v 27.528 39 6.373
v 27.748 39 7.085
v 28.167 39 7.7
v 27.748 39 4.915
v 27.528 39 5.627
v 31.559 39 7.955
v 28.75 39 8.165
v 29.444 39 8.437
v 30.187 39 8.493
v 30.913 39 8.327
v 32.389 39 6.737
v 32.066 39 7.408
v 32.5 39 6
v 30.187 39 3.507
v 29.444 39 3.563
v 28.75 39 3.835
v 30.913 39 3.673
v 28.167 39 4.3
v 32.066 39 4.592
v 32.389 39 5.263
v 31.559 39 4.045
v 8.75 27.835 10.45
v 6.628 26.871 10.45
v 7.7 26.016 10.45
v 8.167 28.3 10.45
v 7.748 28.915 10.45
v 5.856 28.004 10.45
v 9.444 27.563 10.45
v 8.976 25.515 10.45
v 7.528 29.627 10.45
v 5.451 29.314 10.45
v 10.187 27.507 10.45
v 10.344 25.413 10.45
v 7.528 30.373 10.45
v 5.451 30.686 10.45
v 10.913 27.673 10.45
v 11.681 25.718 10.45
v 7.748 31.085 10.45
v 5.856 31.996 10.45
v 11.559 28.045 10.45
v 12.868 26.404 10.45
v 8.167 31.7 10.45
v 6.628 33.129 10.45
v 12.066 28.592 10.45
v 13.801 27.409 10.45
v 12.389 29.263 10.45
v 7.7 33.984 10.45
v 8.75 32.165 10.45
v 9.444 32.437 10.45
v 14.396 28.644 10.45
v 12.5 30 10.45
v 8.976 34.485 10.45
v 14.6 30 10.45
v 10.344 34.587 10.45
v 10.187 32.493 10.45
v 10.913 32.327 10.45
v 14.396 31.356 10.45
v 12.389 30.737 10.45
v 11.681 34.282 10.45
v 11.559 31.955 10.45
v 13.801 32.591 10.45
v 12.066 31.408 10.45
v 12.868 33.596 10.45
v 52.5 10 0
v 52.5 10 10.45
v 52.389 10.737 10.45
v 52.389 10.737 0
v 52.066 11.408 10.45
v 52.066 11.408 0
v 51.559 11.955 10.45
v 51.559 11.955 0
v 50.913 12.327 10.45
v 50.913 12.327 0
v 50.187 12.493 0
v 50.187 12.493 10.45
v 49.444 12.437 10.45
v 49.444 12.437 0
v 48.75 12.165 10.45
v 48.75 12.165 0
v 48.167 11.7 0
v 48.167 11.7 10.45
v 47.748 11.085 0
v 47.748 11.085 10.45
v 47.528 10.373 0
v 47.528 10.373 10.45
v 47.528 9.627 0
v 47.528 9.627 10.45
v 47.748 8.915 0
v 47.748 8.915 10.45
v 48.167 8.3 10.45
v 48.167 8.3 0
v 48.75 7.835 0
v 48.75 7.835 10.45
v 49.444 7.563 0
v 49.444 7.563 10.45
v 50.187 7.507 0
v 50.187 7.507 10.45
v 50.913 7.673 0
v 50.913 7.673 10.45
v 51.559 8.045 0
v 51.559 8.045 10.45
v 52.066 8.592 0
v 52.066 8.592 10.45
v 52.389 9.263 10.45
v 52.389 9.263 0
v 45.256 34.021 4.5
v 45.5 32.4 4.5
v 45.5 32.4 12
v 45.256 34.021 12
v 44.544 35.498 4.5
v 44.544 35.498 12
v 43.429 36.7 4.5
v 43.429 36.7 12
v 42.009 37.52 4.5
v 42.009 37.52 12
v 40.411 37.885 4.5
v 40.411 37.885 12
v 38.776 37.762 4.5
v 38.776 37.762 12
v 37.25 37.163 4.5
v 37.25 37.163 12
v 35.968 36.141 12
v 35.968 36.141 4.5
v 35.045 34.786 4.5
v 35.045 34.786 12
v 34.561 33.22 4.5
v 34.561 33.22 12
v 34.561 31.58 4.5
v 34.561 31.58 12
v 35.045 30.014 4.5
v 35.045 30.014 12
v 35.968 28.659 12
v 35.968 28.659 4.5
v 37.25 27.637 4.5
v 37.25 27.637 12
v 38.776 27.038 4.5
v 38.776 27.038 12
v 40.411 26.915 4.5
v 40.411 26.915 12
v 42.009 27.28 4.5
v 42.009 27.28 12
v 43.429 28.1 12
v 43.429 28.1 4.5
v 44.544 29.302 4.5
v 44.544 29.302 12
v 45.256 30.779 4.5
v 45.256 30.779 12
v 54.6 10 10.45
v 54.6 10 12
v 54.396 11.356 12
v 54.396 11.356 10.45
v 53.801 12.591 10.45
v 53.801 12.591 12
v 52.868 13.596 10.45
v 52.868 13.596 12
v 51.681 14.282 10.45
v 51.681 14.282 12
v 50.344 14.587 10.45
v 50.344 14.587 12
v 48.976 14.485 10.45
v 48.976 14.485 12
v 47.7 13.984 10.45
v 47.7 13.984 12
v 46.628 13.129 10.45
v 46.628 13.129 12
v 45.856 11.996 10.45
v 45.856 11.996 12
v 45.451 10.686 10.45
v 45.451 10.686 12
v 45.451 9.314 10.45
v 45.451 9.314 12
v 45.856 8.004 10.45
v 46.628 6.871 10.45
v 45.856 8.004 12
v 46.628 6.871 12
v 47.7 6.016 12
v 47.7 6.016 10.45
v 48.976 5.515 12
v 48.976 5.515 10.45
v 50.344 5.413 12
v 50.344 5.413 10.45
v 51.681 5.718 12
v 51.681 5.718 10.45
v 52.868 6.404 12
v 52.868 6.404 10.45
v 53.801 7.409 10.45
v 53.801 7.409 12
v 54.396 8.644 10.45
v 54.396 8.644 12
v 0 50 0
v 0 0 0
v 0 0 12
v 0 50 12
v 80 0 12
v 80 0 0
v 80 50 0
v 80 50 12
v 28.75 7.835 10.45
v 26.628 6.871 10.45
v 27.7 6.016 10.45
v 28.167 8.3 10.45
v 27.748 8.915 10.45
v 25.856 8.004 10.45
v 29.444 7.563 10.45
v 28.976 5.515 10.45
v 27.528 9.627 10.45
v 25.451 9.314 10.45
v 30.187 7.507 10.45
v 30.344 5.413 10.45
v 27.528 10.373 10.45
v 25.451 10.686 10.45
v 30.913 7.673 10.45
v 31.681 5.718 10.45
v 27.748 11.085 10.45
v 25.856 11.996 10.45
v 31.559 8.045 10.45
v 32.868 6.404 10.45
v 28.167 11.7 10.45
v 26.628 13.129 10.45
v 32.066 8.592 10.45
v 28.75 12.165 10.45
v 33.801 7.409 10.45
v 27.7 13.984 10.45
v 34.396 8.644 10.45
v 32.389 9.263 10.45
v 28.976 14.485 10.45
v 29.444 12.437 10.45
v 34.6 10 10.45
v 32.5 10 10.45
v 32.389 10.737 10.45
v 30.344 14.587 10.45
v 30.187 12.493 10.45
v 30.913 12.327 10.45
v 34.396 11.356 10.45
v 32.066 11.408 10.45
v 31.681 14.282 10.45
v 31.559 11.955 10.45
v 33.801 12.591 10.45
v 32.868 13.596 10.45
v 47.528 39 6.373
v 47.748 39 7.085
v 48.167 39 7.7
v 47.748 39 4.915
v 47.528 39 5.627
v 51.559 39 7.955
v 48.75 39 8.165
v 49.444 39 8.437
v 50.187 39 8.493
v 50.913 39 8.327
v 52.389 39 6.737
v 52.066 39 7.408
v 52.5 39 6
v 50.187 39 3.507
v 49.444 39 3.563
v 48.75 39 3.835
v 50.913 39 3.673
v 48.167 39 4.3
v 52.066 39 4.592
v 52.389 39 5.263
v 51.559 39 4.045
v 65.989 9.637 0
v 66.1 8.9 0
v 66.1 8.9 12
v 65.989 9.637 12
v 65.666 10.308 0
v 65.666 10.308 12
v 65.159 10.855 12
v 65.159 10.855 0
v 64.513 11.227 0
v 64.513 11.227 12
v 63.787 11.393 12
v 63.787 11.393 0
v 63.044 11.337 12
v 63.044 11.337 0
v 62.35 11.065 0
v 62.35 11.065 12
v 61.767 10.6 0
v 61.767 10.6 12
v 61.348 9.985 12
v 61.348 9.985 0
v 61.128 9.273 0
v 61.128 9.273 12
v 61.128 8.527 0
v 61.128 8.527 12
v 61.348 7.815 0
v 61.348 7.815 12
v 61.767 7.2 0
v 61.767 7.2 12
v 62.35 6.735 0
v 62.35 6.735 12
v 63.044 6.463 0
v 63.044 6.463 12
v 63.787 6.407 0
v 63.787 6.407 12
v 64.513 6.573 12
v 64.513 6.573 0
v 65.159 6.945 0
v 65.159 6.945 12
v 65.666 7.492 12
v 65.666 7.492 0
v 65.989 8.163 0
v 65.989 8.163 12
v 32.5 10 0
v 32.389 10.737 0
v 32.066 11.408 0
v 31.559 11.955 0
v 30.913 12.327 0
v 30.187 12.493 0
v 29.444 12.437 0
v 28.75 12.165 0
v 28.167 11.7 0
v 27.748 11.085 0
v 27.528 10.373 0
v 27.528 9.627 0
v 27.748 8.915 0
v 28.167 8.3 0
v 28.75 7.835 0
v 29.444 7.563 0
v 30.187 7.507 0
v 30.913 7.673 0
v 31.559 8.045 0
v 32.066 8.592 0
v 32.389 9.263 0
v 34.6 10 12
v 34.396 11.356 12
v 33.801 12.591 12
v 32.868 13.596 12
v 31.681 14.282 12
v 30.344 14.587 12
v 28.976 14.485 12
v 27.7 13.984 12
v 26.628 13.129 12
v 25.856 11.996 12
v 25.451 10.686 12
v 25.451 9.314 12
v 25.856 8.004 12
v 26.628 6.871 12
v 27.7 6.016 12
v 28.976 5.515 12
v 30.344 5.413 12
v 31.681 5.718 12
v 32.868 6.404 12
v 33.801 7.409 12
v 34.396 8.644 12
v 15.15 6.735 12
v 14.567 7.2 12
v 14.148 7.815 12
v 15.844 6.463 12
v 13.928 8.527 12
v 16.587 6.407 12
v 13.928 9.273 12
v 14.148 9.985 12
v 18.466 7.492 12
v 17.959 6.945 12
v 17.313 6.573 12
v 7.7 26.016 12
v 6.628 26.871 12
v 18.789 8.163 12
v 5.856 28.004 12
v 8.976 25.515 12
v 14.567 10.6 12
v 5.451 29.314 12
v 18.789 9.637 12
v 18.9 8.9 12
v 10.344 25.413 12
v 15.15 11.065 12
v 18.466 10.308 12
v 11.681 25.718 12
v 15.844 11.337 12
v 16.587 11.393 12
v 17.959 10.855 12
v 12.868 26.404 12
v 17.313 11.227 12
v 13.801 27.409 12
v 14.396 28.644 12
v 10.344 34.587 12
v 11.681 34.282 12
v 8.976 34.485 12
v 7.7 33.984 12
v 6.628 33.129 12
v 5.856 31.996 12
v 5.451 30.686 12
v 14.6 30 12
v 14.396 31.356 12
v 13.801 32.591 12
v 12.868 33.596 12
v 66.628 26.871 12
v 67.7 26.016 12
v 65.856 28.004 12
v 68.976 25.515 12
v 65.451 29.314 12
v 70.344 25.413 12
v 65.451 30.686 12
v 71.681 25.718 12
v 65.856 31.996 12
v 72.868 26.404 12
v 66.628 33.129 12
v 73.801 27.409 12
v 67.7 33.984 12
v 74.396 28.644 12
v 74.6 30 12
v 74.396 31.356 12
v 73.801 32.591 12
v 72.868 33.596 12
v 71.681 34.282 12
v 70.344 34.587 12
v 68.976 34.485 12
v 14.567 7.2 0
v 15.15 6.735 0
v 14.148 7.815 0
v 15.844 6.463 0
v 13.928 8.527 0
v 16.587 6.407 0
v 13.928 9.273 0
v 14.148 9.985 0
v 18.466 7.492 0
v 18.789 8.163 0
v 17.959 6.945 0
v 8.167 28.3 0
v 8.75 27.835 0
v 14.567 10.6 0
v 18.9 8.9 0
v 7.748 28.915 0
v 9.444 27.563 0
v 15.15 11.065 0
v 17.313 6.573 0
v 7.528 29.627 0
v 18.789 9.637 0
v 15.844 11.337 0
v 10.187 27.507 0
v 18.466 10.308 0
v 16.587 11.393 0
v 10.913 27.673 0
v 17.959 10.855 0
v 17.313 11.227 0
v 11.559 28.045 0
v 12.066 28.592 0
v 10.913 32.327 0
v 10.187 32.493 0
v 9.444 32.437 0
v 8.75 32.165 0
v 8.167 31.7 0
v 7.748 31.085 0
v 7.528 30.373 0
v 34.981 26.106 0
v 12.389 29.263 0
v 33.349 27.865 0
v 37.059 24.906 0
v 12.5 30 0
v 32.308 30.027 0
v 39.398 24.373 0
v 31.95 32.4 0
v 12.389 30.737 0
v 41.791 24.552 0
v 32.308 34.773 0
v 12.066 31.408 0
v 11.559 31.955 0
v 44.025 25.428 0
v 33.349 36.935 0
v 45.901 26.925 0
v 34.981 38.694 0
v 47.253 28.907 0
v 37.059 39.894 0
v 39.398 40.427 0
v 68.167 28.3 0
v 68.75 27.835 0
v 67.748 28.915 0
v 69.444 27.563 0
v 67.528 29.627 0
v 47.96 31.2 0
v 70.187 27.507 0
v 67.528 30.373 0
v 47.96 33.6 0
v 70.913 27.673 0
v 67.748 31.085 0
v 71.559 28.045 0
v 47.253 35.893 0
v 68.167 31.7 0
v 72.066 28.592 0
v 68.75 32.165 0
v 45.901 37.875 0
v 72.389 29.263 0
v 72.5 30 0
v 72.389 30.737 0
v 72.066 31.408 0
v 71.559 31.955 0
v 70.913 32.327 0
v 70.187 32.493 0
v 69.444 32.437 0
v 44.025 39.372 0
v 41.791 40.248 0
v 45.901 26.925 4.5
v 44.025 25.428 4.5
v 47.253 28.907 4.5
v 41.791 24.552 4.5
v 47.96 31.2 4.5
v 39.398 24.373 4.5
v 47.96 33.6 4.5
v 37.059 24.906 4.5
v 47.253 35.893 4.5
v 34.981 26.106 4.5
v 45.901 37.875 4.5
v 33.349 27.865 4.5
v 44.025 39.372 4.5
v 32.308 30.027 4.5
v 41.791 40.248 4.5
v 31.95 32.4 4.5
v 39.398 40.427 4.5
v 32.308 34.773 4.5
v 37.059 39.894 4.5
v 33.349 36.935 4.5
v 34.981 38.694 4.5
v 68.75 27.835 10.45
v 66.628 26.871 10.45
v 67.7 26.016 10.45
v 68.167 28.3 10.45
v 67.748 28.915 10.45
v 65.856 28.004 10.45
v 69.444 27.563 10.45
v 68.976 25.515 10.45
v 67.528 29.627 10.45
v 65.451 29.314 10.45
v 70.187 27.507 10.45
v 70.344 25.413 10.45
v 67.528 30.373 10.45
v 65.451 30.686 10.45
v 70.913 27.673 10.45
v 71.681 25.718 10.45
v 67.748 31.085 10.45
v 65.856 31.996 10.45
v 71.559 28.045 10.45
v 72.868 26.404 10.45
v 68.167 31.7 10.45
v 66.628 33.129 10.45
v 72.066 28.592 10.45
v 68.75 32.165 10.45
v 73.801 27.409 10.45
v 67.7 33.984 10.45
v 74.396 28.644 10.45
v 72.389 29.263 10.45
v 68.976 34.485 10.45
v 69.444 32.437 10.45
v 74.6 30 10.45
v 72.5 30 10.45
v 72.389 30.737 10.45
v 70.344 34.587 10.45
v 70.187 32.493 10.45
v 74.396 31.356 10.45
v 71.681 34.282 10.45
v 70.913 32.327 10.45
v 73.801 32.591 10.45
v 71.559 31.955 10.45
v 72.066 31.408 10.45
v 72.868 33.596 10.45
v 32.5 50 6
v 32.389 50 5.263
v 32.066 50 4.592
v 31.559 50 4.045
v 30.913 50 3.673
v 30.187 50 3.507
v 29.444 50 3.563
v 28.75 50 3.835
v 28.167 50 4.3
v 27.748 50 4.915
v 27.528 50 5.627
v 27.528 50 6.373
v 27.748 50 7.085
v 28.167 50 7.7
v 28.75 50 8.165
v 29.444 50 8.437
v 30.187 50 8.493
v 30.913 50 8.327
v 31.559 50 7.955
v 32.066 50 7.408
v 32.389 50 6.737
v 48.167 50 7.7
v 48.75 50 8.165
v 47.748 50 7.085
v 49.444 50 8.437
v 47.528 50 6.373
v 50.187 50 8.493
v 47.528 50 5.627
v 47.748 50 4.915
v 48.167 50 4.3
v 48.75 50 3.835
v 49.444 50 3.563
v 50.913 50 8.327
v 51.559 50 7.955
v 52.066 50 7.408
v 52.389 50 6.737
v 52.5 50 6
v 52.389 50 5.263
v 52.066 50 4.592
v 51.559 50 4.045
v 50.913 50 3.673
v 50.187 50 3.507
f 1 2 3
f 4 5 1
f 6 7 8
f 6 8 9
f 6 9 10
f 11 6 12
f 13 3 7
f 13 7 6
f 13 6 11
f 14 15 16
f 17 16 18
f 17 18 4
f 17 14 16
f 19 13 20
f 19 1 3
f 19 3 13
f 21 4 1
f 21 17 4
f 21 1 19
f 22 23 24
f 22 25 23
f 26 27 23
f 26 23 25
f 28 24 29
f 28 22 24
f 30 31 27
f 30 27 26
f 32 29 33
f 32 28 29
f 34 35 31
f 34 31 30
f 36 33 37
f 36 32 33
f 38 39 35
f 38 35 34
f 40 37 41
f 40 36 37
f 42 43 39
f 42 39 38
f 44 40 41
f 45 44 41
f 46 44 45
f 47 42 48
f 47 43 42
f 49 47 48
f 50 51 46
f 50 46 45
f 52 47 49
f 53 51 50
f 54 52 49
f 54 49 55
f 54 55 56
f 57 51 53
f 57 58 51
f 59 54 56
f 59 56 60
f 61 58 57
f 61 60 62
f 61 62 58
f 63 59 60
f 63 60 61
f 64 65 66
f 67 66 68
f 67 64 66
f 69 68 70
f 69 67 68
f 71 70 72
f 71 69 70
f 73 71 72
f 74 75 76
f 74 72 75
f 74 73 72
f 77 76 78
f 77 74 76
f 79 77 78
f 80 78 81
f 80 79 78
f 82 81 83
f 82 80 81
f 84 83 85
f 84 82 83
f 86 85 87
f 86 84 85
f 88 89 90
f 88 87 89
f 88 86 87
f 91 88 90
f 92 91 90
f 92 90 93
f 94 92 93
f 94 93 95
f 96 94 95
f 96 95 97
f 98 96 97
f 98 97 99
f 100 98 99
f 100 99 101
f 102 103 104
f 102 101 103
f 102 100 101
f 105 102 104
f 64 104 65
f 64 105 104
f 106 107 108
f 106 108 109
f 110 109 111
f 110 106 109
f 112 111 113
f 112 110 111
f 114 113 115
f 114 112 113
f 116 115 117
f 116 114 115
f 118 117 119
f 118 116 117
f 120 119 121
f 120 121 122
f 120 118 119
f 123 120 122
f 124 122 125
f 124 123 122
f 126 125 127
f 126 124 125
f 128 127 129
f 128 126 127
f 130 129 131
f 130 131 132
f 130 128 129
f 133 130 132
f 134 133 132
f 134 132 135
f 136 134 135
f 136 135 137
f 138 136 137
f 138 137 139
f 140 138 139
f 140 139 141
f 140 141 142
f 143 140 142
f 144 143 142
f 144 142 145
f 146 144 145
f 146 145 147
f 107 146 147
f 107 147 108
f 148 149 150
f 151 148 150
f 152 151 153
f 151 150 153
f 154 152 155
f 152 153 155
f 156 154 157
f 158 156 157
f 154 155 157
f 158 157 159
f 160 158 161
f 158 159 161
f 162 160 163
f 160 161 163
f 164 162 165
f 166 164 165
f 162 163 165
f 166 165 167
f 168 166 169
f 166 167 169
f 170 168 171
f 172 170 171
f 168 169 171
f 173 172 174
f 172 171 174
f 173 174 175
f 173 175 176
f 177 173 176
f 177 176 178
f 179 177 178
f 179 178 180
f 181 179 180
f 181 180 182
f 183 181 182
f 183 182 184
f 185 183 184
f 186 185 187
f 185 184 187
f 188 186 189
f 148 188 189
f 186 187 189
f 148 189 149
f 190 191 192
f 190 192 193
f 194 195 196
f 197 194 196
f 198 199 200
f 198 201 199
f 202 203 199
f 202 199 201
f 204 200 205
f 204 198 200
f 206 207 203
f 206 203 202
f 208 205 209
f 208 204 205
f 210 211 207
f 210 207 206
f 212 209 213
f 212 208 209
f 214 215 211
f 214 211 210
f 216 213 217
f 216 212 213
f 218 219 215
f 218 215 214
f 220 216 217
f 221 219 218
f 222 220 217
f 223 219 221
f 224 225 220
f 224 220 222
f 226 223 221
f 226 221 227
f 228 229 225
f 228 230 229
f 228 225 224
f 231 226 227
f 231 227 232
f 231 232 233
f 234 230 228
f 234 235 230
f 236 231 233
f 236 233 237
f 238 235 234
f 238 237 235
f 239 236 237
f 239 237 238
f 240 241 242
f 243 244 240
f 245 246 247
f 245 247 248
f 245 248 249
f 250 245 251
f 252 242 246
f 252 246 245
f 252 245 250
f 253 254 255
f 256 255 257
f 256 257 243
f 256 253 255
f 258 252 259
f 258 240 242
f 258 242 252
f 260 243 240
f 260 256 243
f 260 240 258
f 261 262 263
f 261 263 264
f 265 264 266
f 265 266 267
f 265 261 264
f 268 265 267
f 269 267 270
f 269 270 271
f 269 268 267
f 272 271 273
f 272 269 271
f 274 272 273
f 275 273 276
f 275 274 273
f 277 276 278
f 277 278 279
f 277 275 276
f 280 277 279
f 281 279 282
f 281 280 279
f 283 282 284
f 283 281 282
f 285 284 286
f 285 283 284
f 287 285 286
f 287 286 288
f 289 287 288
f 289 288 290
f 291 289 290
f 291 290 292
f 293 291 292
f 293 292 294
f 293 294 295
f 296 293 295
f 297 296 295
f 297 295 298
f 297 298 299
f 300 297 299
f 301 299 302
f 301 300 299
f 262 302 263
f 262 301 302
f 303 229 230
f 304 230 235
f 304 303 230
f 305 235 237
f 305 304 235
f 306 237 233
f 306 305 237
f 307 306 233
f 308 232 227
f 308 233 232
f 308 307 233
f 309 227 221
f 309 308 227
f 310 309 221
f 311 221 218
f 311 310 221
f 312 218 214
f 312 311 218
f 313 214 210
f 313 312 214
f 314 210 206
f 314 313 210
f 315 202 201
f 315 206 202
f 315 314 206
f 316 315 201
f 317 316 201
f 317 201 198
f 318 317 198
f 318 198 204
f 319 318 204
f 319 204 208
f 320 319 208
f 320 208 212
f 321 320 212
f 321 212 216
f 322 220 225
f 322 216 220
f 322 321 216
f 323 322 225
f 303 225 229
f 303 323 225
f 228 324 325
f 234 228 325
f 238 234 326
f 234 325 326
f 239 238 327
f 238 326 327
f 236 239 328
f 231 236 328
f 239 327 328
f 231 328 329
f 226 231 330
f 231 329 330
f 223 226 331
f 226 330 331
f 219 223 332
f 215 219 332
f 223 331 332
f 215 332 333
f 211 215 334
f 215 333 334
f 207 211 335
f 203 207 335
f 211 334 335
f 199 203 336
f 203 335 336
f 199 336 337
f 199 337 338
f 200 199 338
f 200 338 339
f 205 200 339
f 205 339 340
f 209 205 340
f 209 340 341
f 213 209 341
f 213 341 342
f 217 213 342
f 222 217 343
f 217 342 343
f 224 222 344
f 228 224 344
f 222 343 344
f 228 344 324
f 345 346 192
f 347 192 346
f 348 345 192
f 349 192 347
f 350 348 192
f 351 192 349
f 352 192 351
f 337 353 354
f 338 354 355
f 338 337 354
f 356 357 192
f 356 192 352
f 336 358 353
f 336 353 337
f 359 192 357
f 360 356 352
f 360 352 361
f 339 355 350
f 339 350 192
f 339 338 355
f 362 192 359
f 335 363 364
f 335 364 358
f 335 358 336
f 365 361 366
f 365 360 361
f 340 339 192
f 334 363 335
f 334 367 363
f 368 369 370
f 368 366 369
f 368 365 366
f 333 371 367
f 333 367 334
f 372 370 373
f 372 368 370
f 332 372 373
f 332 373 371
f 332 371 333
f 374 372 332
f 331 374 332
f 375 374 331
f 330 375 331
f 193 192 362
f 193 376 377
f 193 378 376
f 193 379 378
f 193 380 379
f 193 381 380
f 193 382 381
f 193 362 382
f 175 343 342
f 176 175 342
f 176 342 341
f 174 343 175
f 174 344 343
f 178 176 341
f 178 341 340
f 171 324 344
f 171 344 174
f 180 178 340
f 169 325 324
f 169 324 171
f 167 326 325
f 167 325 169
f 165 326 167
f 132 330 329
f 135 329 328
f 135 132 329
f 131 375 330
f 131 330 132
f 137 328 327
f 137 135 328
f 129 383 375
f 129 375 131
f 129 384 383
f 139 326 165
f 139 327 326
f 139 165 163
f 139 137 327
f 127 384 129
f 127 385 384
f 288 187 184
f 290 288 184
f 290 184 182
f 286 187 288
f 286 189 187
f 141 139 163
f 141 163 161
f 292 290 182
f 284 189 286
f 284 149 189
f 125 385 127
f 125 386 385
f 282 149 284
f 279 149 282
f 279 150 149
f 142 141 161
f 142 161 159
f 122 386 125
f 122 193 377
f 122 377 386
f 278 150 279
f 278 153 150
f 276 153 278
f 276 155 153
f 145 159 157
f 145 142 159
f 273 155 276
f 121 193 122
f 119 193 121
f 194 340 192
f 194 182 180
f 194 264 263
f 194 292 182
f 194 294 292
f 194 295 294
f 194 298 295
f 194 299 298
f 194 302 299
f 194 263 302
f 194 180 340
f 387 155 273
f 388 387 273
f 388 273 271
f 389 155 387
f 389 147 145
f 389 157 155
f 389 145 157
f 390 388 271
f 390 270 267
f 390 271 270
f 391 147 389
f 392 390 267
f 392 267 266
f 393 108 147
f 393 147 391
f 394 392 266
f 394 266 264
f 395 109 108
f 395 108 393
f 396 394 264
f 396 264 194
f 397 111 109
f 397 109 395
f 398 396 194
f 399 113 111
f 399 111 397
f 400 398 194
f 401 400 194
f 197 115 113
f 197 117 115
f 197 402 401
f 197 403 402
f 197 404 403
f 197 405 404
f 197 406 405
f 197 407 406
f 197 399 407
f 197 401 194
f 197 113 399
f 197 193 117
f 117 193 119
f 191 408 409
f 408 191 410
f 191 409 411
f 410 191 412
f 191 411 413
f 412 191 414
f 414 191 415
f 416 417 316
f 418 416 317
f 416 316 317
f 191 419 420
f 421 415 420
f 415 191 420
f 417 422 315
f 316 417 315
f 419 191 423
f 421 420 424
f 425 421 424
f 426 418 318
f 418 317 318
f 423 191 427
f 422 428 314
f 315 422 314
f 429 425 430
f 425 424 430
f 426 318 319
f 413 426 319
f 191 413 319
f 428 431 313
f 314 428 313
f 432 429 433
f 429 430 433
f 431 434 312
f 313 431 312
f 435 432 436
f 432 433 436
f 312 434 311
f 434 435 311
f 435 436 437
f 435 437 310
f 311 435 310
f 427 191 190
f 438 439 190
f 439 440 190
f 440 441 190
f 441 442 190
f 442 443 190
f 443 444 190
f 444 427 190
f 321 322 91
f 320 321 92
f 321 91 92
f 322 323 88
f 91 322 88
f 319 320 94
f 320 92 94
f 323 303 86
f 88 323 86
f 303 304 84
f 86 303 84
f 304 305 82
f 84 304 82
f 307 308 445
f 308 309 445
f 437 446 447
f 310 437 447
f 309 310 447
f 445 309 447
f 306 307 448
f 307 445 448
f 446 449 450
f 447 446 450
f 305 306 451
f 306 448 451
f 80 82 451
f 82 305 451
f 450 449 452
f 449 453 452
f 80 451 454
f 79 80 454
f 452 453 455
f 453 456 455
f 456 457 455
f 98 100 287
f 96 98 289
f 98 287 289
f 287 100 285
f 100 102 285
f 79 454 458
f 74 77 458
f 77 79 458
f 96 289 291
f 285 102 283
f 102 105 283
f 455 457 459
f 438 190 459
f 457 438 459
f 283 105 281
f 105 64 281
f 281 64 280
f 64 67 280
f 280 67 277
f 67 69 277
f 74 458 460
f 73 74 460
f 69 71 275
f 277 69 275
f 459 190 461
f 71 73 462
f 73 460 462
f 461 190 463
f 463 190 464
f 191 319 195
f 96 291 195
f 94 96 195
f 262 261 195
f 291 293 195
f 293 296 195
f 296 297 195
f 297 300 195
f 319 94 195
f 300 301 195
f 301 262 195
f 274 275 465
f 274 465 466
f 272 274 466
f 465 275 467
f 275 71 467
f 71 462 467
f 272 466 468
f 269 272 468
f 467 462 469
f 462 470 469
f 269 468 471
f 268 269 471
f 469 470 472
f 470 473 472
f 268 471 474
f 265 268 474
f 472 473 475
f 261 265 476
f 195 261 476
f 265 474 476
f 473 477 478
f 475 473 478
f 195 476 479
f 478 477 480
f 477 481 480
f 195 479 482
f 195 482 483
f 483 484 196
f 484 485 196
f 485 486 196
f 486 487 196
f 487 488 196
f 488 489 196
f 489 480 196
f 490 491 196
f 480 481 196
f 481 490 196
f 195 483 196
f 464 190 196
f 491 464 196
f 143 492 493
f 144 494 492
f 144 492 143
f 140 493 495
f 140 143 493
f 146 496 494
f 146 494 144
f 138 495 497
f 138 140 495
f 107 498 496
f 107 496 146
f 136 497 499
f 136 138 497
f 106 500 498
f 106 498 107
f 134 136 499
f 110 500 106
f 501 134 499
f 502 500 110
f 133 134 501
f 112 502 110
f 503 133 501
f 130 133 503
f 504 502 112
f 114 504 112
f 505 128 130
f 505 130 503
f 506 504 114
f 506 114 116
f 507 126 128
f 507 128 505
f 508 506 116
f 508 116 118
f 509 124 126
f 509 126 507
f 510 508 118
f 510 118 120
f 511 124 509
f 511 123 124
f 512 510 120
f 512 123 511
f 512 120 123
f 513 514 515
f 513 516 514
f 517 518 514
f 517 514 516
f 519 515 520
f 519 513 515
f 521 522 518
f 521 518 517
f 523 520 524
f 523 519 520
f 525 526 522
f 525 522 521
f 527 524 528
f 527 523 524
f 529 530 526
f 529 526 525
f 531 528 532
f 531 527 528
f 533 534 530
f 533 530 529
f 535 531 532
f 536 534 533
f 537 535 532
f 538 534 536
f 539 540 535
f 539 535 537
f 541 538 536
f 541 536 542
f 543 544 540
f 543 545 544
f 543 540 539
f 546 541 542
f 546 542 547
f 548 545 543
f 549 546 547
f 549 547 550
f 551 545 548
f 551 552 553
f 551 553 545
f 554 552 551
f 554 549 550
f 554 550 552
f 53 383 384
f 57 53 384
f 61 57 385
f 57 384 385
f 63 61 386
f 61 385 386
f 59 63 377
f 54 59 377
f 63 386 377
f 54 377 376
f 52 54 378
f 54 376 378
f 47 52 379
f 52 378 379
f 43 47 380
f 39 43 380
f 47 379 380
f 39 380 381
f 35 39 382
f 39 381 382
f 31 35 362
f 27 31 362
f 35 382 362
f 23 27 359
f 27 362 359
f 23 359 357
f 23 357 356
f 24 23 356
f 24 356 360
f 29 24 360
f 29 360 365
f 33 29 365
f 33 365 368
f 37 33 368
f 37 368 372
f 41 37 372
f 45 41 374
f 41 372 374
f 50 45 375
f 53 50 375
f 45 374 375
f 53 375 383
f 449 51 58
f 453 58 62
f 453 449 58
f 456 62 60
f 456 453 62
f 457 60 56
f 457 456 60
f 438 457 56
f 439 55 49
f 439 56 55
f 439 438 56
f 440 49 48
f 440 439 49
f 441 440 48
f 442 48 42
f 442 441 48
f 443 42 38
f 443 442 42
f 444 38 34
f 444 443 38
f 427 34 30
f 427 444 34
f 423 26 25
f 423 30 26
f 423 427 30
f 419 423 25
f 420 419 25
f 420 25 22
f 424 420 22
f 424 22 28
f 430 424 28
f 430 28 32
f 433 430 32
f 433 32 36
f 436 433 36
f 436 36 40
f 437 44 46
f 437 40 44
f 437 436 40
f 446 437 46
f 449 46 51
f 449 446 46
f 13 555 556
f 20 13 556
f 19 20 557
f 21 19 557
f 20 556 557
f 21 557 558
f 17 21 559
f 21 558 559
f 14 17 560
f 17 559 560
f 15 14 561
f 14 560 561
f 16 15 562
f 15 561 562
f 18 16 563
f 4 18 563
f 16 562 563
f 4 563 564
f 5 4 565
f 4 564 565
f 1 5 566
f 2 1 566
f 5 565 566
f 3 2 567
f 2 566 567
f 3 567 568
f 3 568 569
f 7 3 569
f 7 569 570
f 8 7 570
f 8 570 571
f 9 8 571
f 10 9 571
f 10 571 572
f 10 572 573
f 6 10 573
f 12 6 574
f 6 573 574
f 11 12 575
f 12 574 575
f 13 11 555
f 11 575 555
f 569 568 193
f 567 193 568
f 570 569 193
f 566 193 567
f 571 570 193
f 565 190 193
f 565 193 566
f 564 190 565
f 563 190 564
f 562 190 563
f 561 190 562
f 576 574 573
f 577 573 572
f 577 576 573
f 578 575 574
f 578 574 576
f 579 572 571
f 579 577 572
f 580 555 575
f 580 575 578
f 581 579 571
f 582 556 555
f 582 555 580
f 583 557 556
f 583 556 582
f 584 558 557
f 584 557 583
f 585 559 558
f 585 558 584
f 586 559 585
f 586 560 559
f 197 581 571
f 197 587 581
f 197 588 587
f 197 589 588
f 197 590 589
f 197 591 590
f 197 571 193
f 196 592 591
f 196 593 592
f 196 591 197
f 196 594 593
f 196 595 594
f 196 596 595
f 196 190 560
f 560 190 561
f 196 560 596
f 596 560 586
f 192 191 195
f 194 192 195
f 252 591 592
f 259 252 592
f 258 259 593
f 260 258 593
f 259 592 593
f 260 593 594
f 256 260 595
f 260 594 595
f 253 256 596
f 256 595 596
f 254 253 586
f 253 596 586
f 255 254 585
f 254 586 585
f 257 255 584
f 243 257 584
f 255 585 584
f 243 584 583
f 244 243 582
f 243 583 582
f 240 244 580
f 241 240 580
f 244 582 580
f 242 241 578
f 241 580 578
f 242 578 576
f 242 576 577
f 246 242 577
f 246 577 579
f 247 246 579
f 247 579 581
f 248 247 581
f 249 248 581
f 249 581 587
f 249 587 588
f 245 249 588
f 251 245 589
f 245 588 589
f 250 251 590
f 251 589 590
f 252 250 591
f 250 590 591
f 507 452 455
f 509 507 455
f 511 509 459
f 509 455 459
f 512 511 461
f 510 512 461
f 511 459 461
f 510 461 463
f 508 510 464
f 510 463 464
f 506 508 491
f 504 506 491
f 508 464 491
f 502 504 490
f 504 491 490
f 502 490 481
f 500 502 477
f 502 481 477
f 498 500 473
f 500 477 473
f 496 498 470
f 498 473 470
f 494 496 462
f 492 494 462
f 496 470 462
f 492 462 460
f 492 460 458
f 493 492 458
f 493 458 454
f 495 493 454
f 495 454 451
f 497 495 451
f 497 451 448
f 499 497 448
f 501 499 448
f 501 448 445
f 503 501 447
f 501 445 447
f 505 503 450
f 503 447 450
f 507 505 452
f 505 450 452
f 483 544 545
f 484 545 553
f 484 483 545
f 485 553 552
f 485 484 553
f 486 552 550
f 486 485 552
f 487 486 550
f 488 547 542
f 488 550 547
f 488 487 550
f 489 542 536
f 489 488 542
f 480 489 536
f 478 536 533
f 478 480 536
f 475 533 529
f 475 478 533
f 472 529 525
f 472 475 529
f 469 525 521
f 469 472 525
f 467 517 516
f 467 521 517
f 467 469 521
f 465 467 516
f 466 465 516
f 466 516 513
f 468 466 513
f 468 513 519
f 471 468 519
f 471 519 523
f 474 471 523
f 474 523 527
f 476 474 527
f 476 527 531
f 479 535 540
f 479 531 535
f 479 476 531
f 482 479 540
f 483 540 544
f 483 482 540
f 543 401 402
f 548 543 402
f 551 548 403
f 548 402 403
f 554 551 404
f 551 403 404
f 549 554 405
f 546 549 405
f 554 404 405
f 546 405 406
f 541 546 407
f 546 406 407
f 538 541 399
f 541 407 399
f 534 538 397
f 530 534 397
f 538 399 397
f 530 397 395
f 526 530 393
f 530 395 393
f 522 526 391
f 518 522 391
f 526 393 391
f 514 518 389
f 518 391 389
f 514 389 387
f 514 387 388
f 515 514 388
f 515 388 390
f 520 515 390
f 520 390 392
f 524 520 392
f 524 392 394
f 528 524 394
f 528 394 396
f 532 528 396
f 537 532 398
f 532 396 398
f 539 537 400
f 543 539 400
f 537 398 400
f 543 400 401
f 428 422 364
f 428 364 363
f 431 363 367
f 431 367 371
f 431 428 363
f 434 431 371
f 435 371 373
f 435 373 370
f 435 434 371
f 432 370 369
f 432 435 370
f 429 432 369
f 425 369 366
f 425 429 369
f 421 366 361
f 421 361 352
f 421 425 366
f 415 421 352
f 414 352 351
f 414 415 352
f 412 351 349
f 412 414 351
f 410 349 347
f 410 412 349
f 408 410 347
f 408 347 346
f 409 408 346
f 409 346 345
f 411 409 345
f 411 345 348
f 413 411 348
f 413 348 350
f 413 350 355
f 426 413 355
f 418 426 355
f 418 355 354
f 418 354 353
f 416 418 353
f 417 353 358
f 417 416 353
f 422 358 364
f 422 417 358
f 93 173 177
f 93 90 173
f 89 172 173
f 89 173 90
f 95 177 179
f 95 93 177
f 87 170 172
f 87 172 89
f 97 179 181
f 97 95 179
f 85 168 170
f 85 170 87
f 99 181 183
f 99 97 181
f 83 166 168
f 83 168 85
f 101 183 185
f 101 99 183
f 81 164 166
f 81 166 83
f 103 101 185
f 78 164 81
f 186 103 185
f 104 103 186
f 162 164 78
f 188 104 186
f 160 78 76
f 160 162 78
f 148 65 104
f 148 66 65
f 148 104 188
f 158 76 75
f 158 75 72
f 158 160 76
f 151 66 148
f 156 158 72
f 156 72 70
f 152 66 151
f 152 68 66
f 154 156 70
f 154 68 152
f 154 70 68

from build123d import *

# Parameters (mm, degrees)
SKETCH1_W           = 80
SKETCH1_H           = 50
SKETCH1_R           = 5.5
SKETCH1_R_2         = 2.5
BOSS_EXTRUDE1_DEPTH = 12
SKETCH2_R           = 4.6
CUT_EXTRUDE1_DEPTH  = 1.55
SKETCH3_R           = 8.05
CUT_EXTRUDE2_DEPTH  = 4.5
SKETCH4_R           = 2.5
CUT_EXTRUDE3_DEPTH  = 11


with BuildPart() as part:
    # Sketch1 → Boss-Extrude1 (new body)
    with BuildSketch(Plane.XY):
        with Locations((40, 25)):
            Rectangle(SKETCH1_W, SKETCH1_H)
        with Locations((40, 32.4)):
            Circle(SKETCH1_R, mode=Mode.SUBTRACT)
        with Locations((10, 30)):
            Circle(SKETCH1_R_2, mode=Mode.SUBTRACT)
        with Locations((70, 30)):
            Circle(SKETCH1_R_2, mode=Mode.SUBTRACT)
        with Locations((30, 10)):
            Circle(SKETCH1_R_2, mode=Mode.SUBTRACT)
        with Locations((50, 10)):
            Circle(SKETCH1_R_2, mode=Mode.SUBTRACT)
        with Locations((16.4, 8.9)):
            Circle(SKETCH1_R_2, mode=Mode.SUBTRACT)
        with Locations((63.6, 8.9)):
            Circle(SKETCH1_R_2, mode=Mode.SUBTRACT)
    extrude(amount=BOSS_EXTRUDE1_DEPTH)

    # Sketch2 → Cut-Extrude1 (cut)
    with BuildSketch(Plane.XY.offset(12)):
        with Locations((10, 30)):
            Circle(SKETCH2_R)
        with Locations((70, 30)):
            Circle(SKETCH2_R)
        with Locations((30, 10)):
            Circle(SKETCH2_R)
        with Locations((50, 10)):
            Circle(SKETCH2_R)
    extrude(amount=-CUT_EXTRUDE1_DEPTH, mode=Mode.SUBTRACT)

    # Sketch3 → Cut-Extrude2 (cut)
    with BuildSketch(Plane(origin=(0, 0, 0), x_dir=(-1, 0, 0), z_dir=(0, 0, -1))):
        with Locations((-40, 32.4)):
            Circle(SKETCH3_R)
    extrude(amount=-CUT_EXTRUDE2_DEPTH, mode=Mode.SUBTRACT)

    # Sketch4 → Cut-Extrude3 (cut)
    with BuildSketch(Plane(origin=(0, 50, 0), x_dir=(1, 0, 0), z_dir=(0, 1, 0))):
        with Locations((50, -6)):
            Circle(SKETCH4_R)
        with Locations((30, -6)):
            Circle(SKETCH4_R)
    extrude(amount=-CUT_EXTRUDE3_DEPTH, mode=Mode.SUBTRACT)


solid = part.part
